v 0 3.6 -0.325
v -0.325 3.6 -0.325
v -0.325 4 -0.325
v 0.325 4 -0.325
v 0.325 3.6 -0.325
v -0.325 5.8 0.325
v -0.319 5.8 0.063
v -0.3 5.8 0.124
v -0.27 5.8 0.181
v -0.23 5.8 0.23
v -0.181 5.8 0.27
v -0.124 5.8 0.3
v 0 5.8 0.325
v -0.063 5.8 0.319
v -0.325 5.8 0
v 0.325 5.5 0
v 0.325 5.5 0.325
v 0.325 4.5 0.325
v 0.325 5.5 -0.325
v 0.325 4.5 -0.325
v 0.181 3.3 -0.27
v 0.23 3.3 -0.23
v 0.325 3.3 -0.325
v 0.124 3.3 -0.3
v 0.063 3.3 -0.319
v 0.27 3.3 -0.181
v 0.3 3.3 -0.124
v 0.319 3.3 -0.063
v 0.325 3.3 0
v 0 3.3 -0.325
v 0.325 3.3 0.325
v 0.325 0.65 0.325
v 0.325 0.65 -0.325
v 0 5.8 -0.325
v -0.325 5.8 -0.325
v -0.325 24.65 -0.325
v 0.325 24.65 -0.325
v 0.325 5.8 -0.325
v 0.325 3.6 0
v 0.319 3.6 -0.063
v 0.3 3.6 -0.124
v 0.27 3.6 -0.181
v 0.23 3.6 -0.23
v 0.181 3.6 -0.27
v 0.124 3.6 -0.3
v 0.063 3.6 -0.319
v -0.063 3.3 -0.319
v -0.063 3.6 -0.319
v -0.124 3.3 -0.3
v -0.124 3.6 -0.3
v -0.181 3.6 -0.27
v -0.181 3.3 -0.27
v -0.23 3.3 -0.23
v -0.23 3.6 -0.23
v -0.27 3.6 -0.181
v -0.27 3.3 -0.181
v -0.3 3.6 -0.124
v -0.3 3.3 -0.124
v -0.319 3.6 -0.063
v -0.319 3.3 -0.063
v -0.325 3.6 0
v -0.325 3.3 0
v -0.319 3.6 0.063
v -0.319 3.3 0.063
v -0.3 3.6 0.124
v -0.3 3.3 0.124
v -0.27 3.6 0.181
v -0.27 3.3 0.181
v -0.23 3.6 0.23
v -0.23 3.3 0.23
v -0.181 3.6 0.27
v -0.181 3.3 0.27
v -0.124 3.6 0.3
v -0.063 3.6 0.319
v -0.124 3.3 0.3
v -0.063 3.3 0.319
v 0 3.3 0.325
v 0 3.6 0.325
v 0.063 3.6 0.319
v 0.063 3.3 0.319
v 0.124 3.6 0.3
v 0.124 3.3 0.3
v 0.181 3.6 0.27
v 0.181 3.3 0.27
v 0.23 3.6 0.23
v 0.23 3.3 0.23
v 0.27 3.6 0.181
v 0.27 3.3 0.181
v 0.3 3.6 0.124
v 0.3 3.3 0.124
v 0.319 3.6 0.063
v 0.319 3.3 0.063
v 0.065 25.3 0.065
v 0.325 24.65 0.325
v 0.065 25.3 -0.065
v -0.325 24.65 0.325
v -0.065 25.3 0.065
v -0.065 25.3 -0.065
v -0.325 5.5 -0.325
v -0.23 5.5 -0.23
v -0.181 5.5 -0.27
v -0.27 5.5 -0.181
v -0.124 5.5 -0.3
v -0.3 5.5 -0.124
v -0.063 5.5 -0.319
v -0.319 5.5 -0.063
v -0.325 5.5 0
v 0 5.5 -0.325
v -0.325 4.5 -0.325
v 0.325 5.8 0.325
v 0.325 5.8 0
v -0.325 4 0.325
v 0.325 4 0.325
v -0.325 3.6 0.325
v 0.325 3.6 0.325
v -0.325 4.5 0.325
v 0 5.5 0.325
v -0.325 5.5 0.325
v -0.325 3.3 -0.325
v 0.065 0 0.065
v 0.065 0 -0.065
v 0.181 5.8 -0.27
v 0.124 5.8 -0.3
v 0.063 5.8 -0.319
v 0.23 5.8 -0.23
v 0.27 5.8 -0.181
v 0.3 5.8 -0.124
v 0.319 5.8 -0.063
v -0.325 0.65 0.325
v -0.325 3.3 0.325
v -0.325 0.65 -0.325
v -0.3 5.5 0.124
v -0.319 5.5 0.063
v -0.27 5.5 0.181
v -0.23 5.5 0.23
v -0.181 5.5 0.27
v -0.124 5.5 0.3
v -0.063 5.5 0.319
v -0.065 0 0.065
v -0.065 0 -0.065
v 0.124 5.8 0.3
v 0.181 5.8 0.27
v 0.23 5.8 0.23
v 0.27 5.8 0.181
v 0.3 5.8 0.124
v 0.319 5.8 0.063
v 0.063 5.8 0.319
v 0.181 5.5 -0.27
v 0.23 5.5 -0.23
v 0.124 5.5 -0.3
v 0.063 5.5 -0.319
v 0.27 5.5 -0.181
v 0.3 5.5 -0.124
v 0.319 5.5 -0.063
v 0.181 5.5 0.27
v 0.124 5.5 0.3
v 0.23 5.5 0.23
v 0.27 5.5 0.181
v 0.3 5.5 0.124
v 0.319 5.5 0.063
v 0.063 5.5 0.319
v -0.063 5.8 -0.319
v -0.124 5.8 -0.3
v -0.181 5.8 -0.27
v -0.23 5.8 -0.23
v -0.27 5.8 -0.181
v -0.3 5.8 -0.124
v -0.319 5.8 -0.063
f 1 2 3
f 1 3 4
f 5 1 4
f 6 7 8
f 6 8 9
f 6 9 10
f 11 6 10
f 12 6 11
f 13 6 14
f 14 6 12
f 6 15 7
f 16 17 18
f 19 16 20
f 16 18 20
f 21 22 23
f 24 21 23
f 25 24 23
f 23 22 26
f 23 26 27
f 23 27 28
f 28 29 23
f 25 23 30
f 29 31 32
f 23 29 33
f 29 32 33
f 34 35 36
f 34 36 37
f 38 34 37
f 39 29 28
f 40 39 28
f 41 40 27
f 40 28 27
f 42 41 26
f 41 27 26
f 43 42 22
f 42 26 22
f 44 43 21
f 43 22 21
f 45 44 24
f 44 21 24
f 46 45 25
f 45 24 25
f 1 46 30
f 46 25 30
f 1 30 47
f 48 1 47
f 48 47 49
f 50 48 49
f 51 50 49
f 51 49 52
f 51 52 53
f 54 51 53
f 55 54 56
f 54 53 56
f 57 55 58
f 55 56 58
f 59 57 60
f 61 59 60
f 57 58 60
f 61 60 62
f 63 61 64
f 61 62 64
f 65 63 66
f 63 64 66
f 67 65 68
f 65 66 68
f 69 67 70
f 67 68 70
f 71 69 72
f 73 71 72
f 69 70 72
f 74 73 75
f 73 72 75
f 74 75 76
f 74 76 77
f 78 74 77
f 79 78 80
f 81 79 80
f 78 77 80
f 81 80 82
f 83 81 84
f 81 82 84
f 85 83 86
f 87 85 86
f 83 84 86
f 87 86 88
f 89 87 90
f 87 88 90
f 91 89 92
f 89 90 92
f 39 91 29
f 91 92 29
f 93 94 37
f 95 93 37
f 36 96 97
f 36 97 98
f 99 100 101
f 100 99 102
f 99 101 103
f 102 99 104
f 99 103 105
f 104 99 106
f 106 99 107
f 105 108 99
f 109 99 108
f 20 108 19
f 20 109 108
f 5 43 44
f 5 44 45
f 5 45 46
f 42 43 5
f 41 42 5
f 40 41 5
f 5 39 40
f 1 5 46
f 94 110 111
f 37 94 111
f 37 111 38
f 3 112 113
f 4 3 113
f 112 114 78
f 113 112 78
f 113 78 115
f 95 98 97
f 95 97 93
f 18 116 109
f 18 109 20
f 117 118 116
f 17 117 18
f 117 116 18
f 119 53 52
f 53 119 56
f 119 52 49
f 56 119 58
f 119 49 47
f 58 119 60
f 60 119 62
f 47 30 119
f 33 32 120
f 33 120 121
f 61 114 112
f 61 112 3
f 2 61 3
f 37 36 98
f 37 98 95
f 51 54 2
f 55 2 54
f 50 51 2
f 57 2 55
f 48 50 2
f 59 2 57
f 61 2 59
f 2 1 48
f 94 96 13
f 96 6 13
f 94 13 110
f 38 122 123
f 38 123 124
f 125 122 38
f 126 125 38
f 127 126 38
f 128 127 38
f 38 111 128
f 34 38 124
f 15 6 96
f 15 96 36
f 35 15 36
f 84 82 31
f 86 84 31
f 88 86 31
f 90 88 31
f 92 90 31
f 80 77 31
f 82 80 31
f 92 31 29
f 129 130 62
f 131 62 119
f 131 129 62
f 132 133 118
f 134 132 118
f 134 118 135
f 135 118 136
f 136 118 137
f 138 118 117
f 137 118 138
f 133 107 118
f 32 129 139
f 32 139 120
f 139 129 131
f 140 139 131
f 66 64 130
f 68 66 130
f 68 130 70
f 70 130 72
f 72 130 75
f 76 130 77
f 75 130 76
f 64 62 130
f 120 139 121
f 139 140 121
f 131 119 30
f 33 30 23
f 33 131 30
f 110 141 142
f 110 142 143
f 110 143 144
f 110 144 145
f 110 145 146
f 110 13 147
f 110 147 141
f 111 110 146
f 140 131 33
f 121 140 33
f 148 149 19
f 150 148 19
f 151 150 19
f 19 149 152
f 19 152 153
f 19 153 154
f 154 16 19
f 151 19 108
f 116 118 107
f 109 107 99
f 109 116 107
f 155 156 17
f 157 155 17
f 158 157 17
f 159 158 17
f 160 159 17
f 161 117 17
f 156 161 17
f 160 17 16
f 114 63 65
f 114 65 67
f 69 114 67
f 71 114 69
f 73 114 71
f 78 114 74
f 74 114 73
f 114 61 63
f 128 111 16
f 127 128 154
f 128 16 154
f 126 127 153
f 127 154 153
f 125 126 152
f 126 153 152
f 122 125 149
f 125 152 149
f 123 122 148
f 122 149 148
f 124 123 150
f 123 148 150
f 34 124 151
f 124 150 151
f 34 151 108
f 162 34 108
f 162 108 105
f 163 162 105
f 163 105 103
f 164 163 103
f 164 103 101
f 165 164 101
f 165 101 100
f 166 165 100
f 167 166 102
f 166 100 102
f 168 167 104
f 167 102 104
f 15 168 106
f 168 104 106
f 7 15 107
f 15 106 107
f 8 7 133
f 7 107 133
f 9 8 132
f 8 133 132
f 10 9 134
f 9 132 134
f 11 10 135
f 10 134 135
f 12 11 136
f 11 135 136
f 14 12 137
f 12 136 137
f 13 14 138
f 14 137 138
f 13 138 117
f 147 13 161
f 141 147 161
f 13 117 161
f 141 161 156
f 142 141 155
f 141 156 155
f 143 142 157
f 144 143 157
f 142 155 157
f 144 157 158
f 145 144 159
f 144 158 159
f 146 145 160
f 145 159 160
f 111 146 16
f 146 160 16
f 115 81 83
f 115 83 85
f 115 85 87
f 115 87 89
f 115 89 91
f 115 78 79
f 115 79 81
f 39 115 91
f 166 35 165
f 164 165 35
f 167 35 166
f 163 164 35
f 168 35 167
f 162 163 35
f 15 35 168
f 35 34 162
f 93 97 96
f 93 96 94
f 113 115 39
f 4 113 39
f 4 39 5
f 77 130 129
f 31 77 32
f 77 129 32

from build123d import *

# Parameters (mm, degrees)
SKETCH2_W             = 0.65
SKETCH2_H             = 0.65
BOSS_EXTRUDE1_DEPTH   = 25.3
SKETCH6_W             = 0.65
SKETCH6_H             = 0.5
CUT_EXTRUDE1_DEPTH    = 1.65
SKETCH7_W             = 0.65
SKETCH7_H             = 0.3
CUT_EXTRUDE2_DEPTH    = 1.65
SKETCH8_R             = 0.325
BOSS_EXTRUDE2_DEPTH   = 0.3
SKETCH9_W             = 0.65
SKETCH9_H             = 0.3
CUT_EXTRUDE3_DEPTH    = 1.65
SKETCH10_R            = 0.325
BOSS_EXTRUDE3_DEPTH   = 0.3
CHAMFER1_SIZE         = 0.65
CHAMFER1_SIZE2        = 0.26
CHAMFER1_PART_2_SIZE  = 0.65
CHAMFER1_PART_2_SIZE2 = 0.26
CHAMFER1_PART_3_SIZE  = 0.65
CHAMFER1_PART_3_SIZE2 = 0.26
CHAMFER1_PART_4_SIZE  = 0.65
CHAMFER1_PART_4_SIZE2 = 0.26
CHAMFER2_SIZE         = 0.26
CHAMFER2_SIZE2        = 0.65


with BuildPart() as part:
    # Sketch2 → Boss-Extrude1 (new body)
    with BuildSketch(Plane(origin=(0, 0, 0), x_dir=(1, 0, 0), z_dir=(0, 1, 0))):
        Rectangle(SKETCH2_W, SKETCH2_H)
    extrude(amount=BOSS_EXTRUDE1_DEPTH)

    # Sketch6 → Cut-Extrude1 (cut, through all)
    with BuildSketch(Plane.XY.offset(0.325)):
        with Locations((0, 4.25)):
            Rectangle(SKETCH6_W, SKETCH6_H)
    extrude(amount=-CUT_EXTRUDE1_DEPTH, mode=Mode.SUBTRACT)

    # Sketch7 → Cut-Extrude2 (cut, through all)
    with BuildSketch(Plane.XY.offset(0.325)):
        with Locations((0, 3.45)):
            Rectangle(SKETCH7_W, SKETCH7_H)
    extrude(amount=-CUT_EXTRUDE2_DEPTH, mode=Mode.SUBTRACT)

    # Sketch8 → Boss-Extrude2 (add)
    with BuildSketch(Plane(origin=(0, 3.3, 0), x_dir=(1, 0, 0), z_dir=(0, 1, 0))):
        Circle(SKETCH8_R)
    extrude(amount=BOSS_EXTRUDE2_DEPTH)

    # Sketch9 → Cut-Extrude3 (cut, through all)
    with BuildSketch(Plane.XY.offset(0.325)):
        with Locations((0, 5.65)):
            Rectangle(SKETCH9_W, SKETCH9_H)
    extrude(amount=-CUT_EXTRUDE3_DEPTH, mode=Mode.SUBTRACT)

    # Sketch10 → Boss-Extrude3 (add)
    with BuildSketch(Plane(origin=(0, 5.5, 0), x_dir=(1, 0, 0), z_dir=(0, 1, 0))):
        Circle(SKETCH10_R)
    extrude(amount=BOSS_EXTRUDE3_DEPTH)

    # Chamfer1
    chamfer1_edges = [part.edges().sort_by_distance(p)[0] for p in [
        (0.325, 25.3, 0),
    ]]
    chamfer1_side = [part.faces().sort_by_distance(p)[0] for p in [
        (0.325, 15.55, 0),
    ]]
    chamfer(chamfer1_edges, length=CHAMFER1_SIZE, length2=CHAMFER1_SIZE2, reference=chamfer1_side[0])

    # Chamfer1 part 2
    chamfer1_part_2_edges = [part.edges().sort_by_distance(p)[0] for p in [
        (0, 25.3, -0.325),
    ]]
    chamfer1_part_2_side = [part.faces().sort_by_distance(p)[0] for p in [
        (0, 15.55, -0.325),
    ]]
    chamfer(chamfer1_part_2_edges, length=CHAMFER1_PART_2_SIZE, length2=CHAMFER1_PART_2_SIZE2, reference=chamfer1_part_2_side[0])

    # Chamfer1 part 3
    chamfer1_part_3_edges = [part.edges().sort_by_distance(p)[0] for p in [
        (-0.325, 25.3, 0),
    ]]
    chamfer1_part_3_side = [part.faces().sort_by_distance(p)[0] for p in [
        (-0.325, 15.55, 0),
    ]]
    chamfer(chamfer1_part_3_edges, length=CHAMFER1_PART_3_SIZE, length2=CHAMFER1_PART_3_SIZE2, reference=chamfer1_part_3_side[0])

    # Chamfer1 part 4
    chamfer1_part_4_edges = [part.edges().sort_by_distance(p)[0] for p in [
        (0, 25.3, 0.325),
    ]]
    chamfer1_part_4_side = [part.faces().sort_by_distance(p)[0] for p in [
        (0, 15.55, 0.325),
    ]]
    chamfer(chamfer1_part_4_edges, length=CHAMFER1_PART_4_SIZE, length2=CHAMFER1_PART_4_SIZE2, reference=chamfer1_part_4_side[0])

    # Chamfer2
    chamfer2_edges = [part.edges().sort_by_distance(p)[0] for p in [
        (0, 0, 0.325),
        (-0.325, 0, 0),
        (0, 0, -0.325),
        (0.325, 0, 0),
    ]]
    chamfer2_side = [part.faces().sort_by_distance(p)[0] for p in [
        (0, 0, 0),
    ]]
    chamfer(chamfer2_edges, length=CHAMFER2_SIZE, length2=CHAMFER2_SIZE2, reference=chamfer2_side[0])


solid = part.part
